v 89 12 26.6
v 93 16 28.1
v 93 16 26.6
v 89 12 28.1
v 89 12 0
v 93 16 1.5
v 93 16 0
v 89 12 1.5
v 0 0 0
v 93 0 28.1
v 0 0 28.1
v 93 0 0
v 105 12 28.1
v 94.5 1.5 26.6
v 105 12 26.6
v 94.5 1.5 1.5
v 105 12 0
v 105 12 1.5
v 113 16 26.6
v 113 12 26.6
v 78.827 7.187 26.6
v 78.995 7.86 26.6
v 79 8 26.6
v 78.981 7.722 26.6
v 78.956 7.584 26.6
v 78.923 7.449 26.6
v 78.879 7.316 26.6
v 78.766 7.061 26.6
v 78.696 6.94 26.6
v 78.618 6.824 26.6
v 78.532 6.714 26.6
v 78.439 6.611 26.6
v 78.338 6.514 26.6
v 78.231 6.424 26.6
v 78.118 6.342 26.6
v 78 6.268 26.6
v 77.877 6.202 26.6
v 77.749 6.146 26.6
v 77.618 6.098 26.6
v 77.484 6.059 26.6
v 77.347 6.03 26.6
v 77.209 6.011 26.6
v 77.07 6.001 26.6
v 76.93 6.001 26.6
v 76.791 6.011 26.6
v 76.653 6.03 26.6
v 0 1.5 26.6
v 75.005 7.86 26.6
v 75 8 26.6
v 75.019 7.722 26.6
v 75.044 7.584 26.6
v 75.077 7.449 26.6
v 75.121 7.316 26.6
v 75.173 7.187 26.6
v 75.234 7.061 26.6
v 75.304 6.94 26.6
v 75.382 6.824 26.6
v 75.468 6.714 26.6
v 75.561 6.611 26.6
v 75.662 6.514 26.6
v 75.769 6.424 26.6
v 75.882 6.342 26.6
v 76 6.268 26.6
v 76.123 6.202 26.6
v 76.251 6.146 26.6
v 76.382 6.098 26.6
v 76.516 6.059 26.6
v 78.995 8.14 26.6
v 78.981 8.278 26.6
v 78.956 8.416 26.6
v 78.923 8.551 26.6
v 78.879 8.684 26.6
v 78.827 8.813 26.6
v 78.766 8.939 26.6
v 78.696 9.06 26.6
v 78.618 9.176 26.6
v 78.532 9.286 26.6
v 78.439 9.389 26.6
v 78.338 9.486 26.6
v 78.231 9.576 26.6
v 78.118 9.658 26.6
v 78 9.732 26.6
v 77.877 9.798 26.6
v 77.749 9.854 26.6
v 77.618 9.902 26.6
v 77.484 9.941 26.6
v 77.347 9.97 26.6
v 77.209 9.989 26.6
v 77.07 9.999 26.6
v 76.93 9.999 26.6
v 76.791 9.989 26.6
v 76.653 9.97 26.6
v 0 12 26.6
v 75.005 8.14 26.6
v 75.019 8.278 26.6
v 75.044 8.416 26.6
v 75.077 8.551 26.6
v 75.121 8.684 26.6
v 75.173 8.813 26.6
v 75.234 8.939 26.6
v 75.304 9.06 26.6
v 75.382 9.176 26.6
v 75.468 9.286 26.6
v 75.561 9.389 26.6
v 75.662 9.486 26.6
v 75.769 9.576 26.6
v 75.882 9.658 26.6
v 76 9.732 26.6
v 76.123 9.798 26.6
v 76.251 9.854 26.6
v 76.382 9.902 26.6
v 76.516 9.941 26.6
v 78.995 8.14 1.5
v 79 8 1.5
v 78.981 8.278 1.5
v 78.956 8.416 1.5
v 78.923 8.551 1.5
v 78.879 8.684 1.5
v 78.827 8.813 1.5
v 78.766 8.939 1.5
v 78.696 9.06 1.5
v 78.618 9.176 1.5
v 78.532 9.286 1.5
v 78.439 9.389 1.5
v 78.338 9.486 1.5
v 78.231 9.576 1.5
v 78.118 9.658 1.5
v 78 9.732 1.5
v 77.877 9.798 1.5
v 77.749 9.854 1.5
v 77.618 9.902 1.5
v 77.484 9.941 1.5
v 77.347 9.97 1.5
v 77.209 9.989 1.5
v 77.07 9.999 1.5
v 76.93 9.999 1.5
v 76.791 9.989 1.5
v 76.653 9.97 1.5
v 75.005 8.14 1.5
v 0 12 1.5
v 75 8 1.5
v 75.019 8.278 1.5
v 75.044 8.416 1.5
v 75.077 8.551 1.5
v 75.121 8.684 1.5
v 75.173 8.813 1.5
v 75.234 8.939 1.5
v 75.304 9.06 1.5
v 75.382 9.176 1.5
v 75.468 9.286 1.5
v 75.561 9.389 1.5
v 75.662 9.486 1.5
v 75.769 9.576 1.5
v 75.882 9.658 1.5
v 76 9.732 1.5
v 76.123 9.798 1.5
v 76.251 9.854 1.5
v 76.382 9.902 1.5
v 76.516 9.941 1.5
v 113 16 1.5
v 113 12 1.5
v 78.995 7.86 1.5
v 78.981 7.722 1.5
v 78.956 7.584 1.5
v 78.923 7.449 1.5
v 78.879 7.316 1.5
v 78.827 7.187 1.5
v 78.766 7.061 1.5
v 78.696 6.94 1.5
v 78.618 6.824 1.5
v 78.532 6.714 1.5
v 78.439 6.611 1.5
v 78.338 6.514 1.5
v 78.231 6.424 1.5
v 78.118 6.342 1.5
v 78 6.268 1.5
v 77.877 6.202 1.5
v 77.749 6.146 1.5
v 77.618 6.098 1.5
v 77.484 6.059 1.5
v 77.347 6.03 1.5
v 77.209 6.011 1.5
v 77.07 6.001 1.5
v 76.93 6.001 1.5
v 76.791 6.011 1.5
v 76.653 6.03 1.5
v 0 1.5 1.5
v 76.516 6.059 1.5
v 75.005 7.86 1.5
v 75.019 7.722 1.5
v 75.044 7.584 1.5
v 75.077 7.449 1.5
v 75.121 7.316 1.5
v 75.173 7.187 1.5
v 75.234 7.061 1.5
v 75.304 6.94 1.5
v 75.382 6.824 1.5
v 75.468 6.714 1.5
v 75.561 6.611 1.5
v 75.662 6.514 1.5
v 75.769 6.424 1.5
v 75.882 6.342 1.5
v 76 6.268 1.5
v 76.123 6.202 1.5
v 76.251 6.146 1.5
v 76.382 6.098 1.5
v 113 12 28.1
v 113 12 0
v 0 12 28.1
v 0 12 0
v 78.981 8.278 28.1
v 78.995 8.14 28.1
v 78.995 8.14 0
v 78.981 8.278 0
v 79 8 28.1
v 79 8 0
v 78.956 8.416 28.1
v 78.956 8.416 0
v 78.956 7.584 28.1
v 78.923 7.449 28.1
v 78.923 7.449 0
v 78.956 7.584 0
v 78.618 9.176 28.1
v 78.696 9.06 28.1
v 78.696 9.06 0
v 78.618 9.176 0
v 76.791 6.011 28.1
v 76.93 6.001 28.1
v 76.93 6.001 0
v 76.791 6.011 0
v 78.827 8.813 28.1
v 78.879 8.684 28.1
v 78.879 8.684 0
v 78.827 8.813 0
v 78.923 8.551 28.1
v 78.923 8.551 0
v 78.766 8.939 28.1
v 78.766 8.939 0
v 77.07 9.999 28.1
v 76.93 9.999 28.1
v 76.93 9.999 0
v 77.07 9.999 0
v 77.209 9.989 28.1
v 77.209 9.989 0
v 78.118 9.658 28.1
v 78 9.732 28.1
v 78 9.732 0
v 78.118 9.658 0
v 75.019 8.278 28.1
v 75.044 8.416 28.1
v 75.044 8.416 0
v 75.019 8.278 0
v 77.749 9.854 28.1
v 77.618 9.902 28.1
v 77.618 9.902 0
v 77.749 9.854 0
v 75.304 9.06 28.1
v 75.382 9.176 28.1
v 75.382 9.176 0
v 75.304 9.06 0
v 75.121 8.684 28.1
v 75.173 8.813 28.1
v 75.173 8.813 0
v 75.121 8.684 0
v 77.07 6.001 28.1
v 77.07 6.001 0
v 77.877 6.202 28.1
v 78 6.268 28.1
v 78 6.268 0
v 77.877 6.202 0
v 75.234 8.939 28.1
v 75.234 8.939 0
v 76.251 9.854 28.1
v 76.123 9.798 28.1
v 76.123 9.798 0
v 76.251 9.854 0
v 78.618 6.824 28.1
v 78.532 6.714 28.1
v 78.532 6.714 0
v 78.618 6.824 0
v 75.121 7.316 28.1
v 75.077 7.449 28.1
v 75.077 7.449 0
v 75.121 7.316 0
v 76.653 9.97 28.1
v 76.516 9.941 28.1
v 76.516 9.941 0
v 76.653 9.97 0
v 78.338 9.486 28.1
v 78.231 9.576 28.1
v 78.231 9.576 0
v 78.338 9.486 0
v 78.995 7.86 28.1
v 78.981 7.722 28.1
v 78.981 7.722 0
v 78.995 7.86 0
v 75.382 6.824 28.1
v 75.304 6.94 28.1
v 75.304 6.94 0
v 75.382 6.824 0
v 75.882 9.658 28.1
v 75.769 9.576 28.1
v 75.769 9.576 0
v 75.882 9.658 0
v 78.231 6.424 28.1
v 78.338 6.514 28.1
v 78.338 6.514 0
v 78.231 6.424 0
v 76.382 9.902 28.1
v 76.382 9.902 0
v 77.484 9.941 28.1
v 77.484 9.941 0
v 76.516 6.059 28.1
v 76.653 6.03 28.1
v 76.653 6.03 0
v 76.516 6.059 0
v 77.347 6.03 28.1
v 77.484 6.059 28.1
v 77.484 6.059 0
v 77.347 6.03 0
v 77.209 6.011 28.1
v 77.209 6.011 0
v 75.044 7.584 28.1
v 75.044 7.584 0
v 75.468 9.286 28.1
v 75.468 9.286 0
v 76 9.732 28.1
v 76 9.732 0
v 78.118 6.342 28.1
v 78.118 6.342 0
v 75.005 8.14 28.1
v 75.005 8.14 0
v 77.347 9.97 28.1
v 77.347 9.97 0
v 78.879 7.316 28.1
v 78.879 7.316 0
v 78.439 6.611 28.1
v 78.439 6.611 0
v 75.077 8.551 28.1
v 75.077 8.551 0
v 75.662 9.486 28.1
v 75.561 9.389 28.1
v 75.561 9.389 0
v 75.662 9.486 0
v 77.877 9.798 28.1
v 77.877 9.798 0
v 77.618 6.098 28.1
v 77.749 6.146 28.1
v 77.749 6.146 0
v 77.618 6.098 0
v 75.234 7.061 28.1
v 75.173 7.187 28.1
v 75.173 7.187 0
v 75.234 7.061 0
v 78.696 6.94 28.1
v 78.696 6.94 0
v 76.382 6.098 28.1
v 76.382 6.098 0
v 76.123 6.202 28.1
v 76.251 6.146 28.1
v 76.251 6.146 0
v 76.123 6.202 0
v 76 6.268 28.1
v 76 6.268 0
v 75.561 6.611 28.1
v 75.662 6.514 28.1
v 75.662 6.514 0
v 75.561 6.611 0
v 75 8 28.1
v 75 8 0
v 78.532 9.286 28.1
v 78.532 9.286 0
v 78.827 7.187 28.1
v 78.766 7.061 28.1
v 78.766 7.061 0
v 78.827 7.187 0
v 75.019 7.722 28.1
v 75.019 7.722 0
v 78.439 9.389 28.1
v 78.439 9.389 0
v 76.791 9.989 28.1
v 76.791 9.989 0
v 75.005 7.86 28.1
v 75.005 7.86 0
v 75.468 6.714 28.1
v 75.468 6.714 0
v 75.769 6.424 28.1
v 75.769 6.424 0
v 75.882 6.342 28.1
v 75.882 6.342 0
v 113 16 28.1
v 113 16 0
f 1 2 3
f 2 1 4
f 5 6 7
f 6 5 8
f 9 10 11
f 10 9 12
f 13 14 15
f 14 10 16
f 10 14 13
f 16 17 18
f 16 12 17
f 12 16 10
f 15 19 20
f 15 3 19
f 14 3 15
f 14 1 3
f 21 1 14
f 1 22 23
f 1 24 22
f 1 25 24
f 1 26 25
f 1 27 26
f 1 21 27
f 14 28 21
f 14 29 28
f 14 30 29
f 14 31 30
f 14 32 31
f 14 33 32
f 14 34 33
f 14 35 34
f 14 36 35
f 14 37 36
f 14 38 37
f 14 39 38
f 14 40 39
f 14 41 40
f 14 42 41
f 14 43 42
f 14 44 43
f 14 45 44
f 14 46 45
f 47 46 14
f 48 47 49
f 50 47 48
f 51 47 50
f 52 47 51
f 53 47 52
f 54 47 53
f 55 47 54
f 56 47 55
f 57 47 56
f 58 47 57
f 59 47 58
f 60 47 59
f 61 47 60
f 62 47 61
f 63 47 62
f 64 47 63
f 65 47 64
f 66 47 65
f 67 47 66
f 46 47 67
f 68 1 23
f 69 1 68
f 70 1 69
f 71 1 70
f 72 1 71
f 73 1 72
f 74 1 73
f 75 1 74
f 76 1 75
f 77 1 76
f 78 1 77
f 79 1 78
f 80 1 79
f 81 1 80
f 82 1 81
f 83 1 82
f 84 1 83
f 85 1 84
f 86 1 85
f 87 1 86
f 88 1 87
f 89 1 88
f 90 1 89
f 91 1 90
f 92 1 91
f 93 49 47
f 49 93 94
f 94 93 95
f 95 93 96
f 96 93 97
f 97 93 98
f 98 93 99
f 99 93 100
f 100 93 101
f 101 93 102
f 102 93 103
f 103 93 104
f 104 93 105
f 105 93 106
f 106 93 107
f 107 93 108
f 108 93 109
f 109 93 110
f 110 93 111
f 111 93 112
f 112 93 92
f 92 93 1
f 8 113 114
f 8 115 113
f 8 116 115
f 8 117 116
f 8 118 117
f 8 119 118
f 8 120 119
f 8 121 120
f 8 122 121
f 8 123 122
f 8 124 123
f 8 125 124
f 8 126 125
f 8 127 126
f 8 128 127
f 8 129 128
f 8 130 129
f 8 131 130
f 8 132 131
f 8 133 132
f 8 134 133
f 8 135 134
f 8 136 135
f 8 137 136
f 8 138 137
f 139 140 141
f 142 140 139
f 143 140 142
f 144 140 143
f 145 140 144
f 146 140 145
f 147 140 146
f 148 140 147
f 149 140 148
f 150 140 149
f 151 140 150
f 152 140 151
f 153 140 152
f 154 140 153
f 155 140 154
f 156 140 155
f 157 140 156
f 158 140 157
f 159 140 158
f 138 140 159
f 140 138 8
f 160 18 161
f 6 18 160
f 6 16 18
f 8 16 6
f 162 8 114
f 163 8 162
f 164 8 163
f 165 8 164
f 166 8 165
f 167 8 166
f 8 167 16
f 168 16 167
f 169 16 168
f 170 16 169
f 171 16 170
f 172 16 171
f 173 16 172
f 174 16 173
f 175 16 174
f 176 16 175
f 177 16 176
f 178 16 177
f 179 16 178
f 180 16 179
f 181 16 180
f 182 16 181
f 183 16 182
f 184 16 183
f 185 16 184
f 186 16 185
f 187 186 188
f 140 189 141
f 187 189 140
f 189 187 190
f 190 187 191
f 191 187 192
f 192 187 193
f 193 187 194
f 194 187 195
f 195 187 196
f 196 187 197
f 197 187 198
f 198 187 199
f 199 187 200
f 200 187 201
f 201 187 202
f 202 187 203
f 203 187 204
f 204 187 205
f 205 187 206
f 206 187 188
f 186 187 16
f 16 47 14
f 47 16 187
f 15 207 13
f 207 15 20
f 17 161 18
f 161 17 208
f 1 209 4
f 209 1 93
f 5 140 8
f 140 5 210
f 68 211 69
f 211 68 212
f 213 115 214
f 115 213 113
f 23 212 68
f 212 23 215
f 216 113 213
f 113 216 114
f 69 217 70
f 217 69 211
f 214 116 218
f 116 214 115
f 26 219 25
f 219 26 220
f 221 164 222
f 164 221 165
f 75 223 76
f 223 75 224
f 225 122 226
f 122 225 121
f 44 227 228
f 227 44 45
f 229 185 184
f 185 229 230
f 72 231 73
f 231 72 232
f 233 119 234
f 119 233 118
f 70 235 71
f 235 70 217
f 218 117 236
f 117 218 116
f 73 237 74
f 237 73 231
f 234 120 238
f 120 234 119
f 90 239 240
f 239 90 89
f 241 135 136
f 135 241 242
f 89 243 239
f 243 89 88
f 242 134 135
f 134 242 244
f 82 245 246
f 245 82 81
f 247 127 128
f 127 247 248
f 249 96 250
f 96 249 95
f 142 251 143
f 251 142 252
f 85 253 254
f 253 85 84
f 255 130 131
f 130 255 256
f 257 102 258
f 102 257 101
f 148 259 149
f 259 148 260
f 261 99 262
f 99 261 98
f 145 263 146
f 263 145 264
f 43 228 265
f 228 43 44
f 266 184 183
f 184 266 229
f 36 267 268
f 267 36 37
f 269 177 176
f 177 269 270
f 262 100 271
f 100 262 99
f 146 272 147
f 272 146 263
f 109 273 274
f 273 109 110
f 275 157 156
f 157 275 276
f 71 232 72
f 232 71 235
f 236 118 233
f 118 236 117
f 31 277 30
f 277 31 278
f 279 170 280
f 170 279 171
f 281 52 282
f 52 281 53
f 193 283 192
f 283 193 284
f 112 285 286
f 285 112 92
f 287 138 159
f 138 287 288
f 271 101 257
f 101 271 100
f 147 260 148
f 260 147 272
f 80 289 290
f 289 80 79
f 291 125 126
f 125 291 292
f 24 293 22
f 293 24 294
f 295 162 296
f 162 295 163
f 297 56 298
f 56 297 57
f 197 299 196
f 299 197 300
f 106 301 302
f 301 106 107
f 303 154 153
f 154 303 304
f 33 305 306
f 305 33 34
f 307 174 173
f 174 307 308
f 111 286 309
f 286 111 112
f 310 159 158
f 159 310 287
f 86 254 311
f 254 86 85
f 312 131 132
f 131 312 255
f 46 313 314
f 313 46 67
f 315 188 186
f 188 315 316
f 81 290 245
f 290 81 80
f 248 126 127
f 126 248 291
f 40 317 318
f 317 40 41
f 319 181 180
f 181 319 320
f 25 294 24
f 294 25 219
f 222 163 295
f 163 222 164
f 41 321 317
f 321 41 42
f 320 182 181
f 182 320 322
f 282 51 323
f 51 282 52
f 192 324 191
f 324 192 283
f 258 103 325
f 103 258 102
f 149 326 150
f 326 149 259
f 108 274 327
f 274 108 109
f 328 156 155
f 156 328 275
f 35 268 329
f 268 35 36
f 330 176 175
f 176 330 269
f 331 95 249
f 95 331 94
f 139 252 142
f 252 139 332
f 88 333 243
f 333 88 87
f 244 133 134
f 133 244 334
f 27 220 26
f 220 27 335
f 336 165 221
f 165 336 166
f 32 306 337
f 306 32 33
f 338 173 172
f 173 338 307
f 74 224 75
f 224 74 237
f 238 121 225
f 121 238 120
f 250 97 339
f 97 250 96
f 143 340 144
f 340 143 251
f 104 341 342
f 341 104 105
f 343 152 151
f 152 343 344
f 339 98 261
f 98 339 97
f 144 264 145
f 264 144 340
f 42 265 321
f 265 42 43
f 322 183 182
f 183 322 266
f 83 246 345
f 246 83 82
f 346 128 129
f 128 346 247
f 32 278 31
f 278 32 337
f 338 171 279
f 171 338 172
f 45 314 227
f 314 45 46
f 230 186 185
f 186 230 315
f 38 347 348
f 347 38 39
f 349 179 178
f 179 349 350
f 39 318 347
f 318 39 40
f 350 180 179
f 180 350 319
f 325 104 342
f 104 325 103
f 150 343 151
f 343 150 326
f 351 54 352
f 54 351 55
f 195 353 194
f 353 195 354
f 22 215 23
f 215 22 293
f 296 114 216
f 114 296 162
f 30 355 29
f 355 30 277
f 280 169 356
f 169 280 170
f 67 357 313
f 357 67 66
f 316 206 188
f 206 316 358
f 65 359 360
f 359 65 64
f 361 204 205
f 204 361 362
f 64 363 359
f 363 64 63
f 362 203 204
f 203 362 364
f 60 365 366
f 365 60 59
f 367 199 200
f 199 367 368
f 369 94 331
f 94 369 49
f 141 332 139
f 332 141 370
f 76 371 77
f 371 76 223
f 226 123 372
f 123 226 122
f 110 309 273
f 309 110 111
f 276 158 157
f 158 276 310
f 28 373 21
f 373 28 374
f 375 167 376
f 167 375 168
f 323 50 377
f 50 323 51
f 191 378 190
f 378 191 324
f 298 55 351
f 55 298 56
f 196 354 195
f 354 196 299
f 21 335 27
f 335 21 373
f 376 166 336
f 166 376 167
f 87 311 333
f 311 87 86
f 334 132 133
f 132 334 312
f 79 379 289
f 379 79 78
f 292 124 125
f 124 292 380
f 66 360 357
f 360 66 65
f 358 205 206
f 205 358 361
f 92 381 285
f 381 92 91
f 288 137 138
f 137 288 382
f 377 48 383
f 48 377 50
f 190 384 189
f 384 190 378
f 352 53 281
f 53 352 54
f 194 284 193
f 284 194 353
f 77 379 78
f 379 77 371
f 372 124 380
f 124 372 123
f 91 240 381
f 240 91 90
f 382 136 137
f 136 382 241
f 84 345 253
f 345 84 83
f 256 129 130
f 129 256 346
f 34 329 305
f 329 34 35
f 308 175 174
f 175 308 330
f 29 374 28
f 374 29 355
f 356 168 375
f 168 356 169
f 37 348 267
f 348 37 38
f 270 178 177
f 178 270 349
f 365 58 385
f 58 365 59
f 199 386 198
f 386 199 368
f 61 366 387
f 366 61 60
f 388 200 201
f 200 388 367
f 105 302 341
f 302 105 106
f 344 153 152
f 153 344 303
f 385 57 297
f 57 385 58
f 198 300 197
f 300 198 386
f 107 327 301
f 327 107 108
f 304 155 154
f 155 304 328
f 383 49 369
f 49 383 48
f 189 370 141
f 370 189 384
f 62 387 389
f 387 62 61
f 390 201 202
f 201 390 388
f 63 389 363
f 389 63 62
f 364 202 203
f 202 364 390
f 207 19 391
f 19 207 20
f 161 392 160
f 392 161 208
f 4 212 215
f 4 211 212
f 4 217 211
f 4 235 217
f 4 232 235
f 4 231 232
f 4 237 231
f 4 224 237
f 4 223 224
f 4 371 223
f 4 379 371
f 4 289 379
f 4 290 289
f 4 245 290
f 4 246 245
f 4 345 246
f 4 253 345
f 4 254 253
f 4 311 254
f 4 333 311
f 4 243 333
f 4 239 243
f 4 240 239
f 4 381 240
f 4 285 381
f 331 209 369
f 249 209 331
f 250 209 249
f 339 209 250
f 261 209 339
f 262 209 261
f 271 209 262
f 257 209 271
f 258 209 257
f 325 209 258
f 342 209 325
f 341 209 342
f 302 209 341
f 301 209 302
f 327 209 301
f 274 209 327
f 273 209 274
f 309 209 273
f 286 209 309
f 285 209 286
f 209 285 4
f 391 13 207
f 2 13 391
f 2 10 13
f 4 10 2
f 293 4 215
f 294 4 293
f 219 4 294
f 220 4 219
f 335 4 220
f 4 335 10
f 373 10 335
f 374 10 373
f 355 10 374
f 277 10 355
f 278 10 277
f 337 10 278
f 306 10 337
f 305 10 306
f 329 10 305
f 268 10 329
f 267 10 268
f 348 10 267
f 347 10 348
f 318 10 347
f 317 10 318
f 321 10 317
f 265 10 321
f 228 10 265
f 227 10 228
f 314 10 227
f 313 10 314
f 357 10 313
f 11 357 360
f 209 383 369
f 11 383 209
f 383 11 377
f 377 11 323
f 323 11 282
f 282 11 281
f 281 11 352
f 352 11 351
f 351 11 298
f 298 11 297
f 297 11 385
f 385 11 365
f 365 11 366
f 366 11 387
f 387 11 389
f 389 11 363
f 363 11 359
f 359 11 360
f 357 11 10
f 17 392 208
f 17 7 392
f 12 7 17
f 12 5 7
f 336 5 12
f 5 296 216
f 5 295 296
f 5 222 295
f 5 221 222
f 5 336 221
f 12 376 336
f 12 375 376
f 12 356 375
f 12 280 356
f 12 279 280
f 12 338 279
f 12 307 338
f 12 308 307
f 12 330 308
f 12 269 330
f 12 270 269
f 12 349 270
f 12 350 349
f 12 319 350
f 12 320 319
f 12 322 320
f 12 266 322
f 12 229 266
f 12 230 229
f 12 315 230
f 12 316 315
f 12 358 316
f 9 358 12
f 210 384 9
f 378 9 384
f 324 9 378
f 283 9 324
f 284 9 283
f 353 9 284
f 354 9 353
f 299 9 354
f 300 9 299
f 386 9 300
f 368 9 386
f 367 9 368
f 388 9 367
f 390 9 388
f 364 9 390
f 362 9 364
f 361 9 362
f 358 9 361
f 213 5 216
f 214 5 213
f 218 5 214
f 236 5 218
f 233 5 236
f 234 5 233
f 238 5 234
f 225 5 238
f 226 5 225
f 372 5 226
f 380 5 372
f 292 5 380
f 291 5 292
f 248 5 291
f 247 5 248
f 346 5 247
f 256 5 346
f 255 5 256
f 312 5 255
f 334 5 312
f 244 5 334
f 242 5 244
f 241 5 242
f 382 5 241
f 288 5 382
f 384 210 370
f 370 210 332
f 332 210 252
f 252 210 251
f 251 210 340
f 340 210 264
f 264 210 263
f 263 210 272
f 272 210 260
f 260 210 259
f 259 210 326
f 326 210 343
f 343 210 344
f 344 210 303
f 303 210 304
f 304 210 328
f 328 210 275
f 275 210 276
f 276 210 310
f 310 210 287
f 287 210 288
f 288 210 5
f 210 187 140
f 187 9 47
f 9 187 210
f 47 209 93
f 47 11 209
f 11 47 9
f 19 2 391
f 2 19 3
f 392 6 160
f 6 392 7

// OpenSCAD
/*

    latch
    
    By Anton Augustsson


*/

$fn=90;  // accuracy

module hddLatch (
    thumbDepth,
    thumbHeight,
    sliderHeight,
    lockLength,
    thickness,
    thicknessFront,
    trayHeight,
    trayWidth,
    trayFrontLength,
    hddWidth,
    hddLenght,
    x,y,z
    ){
/*
    ---------- Local varibles ---------- 
*/


latchWidth = trayWidth;

latchThicnkess = thumbDepth-thickness*2;
lockWidth = 8;
lockLenght = 4;
        
rodDiameter = 4;
        
/*
    ---------- Code ---------- 
*/

translate([
    x,
    y,
    z]) 
rotate ([0,0,0])
difference () {
union () {
    
// Latch
translate([
    0,
    0,
    0]) 
cube(size = [
    latchWidth+lockWidth,
    latchThicnkess+lockLenght,
    trayHeight]);

/* Rod
translate([
    trayWidth-lockWidth*7/2,
    (latchThicnkess+lockLenght)/2,
    0])
cylinder(
    h = trayHeight,
    r = rodDiameter/2
    );
*/    
}

union () {
    
// Remove middle
translate([
    -1,
    thickness,
    thickness]) 
cube(size = [
    latchWidth+lockWidth+2,
    latchThicnkess+lockLenght,
    trayHeight-thickness*2]);

// Remove for lock
translate([
    latchWidth,
    -1,
    -1]) 
cube(size = [
    lockWidth+1,
    latchThicnkess+1,
    trayHeight+2]);

// Remove extra
translate([
    -1,
    latchThicnkess,
    -1]) 
cube(size = [
    latchWidth-lockWidth*2+1,
    lockLenght+1,
    trayHeight+2]);

// Removal triangle 1
translate([
    latchWidth-lockWidth,
    latchThicnkess+lockWidth,
    -1]) 
rotate ([0,0,180]) 
difference () {
cube(size = [
    lockWidth,
    lockWidth,
    trayHeight+2]);
translate([
    0,
    0,
    -1]) 
rotate ([0,0,45]) 
cube(size = [
    lockWidth*sqrt(2),
    lockWidth,
    trayHeight+4]);    
}

// Removal triangle 2
translate([
    latchWidth-latchThicnkess,
    0,
    -1]) 
difference () {
cube(size = [
    latchThicnkess,
    latchThicnkess,
    trayHeight+2]);
translate([
    0,
    0,
    -1]) 
rotate ([0,0,45]) 
cube(size = [
    latchThicnkess*sqrt(2),
    latchThicnkess,
    trayHeight+4]); 
}

// Remove Rod
translate([
    trayWidth-lockWidth*7/2,
    (latchThicnkess+lockLenght)/2,
    -1])
cylinder(
    h = trayHeight+2,
    r = rodDiameter/2
    );

}}}


    
/*
    ---------- Example ---------- 
*/


thicknessBottom = 2; 
thicknessFront = 2;
thickness = 1.5;

hddHeight = 26.1; 
hddWidth = 101.6;  // 4 inches
hddLenght = 147.32; // 5.8

trayHeight = hddHeight+thicknessBottom;
trayFrontLength = 15+thicknessFront; 
trayWidth = 105;
trayLenght = hddLenght+trayFrontLength;

thicknessSide = (trayWidth-hddWidth)/2;


sliderHeight = trayHeight-thickness*2;
thumbDepth = trayFrontLength
    -thicknessFront;
thumbHeight = sliderHeight-(thickness*2);

lockLength = 15;


x=0;
y=0;
z=0;


hddLatch (
    thumbDepth,
    thumbHeight,
    sliderHeight,
    lockLength,
    thickness,
    thicknessFront,
    trayHeight,
    trayWidth,
    trayFrontLength,
    hddWidth,
    hddLenght,
    x,y,z
    );
